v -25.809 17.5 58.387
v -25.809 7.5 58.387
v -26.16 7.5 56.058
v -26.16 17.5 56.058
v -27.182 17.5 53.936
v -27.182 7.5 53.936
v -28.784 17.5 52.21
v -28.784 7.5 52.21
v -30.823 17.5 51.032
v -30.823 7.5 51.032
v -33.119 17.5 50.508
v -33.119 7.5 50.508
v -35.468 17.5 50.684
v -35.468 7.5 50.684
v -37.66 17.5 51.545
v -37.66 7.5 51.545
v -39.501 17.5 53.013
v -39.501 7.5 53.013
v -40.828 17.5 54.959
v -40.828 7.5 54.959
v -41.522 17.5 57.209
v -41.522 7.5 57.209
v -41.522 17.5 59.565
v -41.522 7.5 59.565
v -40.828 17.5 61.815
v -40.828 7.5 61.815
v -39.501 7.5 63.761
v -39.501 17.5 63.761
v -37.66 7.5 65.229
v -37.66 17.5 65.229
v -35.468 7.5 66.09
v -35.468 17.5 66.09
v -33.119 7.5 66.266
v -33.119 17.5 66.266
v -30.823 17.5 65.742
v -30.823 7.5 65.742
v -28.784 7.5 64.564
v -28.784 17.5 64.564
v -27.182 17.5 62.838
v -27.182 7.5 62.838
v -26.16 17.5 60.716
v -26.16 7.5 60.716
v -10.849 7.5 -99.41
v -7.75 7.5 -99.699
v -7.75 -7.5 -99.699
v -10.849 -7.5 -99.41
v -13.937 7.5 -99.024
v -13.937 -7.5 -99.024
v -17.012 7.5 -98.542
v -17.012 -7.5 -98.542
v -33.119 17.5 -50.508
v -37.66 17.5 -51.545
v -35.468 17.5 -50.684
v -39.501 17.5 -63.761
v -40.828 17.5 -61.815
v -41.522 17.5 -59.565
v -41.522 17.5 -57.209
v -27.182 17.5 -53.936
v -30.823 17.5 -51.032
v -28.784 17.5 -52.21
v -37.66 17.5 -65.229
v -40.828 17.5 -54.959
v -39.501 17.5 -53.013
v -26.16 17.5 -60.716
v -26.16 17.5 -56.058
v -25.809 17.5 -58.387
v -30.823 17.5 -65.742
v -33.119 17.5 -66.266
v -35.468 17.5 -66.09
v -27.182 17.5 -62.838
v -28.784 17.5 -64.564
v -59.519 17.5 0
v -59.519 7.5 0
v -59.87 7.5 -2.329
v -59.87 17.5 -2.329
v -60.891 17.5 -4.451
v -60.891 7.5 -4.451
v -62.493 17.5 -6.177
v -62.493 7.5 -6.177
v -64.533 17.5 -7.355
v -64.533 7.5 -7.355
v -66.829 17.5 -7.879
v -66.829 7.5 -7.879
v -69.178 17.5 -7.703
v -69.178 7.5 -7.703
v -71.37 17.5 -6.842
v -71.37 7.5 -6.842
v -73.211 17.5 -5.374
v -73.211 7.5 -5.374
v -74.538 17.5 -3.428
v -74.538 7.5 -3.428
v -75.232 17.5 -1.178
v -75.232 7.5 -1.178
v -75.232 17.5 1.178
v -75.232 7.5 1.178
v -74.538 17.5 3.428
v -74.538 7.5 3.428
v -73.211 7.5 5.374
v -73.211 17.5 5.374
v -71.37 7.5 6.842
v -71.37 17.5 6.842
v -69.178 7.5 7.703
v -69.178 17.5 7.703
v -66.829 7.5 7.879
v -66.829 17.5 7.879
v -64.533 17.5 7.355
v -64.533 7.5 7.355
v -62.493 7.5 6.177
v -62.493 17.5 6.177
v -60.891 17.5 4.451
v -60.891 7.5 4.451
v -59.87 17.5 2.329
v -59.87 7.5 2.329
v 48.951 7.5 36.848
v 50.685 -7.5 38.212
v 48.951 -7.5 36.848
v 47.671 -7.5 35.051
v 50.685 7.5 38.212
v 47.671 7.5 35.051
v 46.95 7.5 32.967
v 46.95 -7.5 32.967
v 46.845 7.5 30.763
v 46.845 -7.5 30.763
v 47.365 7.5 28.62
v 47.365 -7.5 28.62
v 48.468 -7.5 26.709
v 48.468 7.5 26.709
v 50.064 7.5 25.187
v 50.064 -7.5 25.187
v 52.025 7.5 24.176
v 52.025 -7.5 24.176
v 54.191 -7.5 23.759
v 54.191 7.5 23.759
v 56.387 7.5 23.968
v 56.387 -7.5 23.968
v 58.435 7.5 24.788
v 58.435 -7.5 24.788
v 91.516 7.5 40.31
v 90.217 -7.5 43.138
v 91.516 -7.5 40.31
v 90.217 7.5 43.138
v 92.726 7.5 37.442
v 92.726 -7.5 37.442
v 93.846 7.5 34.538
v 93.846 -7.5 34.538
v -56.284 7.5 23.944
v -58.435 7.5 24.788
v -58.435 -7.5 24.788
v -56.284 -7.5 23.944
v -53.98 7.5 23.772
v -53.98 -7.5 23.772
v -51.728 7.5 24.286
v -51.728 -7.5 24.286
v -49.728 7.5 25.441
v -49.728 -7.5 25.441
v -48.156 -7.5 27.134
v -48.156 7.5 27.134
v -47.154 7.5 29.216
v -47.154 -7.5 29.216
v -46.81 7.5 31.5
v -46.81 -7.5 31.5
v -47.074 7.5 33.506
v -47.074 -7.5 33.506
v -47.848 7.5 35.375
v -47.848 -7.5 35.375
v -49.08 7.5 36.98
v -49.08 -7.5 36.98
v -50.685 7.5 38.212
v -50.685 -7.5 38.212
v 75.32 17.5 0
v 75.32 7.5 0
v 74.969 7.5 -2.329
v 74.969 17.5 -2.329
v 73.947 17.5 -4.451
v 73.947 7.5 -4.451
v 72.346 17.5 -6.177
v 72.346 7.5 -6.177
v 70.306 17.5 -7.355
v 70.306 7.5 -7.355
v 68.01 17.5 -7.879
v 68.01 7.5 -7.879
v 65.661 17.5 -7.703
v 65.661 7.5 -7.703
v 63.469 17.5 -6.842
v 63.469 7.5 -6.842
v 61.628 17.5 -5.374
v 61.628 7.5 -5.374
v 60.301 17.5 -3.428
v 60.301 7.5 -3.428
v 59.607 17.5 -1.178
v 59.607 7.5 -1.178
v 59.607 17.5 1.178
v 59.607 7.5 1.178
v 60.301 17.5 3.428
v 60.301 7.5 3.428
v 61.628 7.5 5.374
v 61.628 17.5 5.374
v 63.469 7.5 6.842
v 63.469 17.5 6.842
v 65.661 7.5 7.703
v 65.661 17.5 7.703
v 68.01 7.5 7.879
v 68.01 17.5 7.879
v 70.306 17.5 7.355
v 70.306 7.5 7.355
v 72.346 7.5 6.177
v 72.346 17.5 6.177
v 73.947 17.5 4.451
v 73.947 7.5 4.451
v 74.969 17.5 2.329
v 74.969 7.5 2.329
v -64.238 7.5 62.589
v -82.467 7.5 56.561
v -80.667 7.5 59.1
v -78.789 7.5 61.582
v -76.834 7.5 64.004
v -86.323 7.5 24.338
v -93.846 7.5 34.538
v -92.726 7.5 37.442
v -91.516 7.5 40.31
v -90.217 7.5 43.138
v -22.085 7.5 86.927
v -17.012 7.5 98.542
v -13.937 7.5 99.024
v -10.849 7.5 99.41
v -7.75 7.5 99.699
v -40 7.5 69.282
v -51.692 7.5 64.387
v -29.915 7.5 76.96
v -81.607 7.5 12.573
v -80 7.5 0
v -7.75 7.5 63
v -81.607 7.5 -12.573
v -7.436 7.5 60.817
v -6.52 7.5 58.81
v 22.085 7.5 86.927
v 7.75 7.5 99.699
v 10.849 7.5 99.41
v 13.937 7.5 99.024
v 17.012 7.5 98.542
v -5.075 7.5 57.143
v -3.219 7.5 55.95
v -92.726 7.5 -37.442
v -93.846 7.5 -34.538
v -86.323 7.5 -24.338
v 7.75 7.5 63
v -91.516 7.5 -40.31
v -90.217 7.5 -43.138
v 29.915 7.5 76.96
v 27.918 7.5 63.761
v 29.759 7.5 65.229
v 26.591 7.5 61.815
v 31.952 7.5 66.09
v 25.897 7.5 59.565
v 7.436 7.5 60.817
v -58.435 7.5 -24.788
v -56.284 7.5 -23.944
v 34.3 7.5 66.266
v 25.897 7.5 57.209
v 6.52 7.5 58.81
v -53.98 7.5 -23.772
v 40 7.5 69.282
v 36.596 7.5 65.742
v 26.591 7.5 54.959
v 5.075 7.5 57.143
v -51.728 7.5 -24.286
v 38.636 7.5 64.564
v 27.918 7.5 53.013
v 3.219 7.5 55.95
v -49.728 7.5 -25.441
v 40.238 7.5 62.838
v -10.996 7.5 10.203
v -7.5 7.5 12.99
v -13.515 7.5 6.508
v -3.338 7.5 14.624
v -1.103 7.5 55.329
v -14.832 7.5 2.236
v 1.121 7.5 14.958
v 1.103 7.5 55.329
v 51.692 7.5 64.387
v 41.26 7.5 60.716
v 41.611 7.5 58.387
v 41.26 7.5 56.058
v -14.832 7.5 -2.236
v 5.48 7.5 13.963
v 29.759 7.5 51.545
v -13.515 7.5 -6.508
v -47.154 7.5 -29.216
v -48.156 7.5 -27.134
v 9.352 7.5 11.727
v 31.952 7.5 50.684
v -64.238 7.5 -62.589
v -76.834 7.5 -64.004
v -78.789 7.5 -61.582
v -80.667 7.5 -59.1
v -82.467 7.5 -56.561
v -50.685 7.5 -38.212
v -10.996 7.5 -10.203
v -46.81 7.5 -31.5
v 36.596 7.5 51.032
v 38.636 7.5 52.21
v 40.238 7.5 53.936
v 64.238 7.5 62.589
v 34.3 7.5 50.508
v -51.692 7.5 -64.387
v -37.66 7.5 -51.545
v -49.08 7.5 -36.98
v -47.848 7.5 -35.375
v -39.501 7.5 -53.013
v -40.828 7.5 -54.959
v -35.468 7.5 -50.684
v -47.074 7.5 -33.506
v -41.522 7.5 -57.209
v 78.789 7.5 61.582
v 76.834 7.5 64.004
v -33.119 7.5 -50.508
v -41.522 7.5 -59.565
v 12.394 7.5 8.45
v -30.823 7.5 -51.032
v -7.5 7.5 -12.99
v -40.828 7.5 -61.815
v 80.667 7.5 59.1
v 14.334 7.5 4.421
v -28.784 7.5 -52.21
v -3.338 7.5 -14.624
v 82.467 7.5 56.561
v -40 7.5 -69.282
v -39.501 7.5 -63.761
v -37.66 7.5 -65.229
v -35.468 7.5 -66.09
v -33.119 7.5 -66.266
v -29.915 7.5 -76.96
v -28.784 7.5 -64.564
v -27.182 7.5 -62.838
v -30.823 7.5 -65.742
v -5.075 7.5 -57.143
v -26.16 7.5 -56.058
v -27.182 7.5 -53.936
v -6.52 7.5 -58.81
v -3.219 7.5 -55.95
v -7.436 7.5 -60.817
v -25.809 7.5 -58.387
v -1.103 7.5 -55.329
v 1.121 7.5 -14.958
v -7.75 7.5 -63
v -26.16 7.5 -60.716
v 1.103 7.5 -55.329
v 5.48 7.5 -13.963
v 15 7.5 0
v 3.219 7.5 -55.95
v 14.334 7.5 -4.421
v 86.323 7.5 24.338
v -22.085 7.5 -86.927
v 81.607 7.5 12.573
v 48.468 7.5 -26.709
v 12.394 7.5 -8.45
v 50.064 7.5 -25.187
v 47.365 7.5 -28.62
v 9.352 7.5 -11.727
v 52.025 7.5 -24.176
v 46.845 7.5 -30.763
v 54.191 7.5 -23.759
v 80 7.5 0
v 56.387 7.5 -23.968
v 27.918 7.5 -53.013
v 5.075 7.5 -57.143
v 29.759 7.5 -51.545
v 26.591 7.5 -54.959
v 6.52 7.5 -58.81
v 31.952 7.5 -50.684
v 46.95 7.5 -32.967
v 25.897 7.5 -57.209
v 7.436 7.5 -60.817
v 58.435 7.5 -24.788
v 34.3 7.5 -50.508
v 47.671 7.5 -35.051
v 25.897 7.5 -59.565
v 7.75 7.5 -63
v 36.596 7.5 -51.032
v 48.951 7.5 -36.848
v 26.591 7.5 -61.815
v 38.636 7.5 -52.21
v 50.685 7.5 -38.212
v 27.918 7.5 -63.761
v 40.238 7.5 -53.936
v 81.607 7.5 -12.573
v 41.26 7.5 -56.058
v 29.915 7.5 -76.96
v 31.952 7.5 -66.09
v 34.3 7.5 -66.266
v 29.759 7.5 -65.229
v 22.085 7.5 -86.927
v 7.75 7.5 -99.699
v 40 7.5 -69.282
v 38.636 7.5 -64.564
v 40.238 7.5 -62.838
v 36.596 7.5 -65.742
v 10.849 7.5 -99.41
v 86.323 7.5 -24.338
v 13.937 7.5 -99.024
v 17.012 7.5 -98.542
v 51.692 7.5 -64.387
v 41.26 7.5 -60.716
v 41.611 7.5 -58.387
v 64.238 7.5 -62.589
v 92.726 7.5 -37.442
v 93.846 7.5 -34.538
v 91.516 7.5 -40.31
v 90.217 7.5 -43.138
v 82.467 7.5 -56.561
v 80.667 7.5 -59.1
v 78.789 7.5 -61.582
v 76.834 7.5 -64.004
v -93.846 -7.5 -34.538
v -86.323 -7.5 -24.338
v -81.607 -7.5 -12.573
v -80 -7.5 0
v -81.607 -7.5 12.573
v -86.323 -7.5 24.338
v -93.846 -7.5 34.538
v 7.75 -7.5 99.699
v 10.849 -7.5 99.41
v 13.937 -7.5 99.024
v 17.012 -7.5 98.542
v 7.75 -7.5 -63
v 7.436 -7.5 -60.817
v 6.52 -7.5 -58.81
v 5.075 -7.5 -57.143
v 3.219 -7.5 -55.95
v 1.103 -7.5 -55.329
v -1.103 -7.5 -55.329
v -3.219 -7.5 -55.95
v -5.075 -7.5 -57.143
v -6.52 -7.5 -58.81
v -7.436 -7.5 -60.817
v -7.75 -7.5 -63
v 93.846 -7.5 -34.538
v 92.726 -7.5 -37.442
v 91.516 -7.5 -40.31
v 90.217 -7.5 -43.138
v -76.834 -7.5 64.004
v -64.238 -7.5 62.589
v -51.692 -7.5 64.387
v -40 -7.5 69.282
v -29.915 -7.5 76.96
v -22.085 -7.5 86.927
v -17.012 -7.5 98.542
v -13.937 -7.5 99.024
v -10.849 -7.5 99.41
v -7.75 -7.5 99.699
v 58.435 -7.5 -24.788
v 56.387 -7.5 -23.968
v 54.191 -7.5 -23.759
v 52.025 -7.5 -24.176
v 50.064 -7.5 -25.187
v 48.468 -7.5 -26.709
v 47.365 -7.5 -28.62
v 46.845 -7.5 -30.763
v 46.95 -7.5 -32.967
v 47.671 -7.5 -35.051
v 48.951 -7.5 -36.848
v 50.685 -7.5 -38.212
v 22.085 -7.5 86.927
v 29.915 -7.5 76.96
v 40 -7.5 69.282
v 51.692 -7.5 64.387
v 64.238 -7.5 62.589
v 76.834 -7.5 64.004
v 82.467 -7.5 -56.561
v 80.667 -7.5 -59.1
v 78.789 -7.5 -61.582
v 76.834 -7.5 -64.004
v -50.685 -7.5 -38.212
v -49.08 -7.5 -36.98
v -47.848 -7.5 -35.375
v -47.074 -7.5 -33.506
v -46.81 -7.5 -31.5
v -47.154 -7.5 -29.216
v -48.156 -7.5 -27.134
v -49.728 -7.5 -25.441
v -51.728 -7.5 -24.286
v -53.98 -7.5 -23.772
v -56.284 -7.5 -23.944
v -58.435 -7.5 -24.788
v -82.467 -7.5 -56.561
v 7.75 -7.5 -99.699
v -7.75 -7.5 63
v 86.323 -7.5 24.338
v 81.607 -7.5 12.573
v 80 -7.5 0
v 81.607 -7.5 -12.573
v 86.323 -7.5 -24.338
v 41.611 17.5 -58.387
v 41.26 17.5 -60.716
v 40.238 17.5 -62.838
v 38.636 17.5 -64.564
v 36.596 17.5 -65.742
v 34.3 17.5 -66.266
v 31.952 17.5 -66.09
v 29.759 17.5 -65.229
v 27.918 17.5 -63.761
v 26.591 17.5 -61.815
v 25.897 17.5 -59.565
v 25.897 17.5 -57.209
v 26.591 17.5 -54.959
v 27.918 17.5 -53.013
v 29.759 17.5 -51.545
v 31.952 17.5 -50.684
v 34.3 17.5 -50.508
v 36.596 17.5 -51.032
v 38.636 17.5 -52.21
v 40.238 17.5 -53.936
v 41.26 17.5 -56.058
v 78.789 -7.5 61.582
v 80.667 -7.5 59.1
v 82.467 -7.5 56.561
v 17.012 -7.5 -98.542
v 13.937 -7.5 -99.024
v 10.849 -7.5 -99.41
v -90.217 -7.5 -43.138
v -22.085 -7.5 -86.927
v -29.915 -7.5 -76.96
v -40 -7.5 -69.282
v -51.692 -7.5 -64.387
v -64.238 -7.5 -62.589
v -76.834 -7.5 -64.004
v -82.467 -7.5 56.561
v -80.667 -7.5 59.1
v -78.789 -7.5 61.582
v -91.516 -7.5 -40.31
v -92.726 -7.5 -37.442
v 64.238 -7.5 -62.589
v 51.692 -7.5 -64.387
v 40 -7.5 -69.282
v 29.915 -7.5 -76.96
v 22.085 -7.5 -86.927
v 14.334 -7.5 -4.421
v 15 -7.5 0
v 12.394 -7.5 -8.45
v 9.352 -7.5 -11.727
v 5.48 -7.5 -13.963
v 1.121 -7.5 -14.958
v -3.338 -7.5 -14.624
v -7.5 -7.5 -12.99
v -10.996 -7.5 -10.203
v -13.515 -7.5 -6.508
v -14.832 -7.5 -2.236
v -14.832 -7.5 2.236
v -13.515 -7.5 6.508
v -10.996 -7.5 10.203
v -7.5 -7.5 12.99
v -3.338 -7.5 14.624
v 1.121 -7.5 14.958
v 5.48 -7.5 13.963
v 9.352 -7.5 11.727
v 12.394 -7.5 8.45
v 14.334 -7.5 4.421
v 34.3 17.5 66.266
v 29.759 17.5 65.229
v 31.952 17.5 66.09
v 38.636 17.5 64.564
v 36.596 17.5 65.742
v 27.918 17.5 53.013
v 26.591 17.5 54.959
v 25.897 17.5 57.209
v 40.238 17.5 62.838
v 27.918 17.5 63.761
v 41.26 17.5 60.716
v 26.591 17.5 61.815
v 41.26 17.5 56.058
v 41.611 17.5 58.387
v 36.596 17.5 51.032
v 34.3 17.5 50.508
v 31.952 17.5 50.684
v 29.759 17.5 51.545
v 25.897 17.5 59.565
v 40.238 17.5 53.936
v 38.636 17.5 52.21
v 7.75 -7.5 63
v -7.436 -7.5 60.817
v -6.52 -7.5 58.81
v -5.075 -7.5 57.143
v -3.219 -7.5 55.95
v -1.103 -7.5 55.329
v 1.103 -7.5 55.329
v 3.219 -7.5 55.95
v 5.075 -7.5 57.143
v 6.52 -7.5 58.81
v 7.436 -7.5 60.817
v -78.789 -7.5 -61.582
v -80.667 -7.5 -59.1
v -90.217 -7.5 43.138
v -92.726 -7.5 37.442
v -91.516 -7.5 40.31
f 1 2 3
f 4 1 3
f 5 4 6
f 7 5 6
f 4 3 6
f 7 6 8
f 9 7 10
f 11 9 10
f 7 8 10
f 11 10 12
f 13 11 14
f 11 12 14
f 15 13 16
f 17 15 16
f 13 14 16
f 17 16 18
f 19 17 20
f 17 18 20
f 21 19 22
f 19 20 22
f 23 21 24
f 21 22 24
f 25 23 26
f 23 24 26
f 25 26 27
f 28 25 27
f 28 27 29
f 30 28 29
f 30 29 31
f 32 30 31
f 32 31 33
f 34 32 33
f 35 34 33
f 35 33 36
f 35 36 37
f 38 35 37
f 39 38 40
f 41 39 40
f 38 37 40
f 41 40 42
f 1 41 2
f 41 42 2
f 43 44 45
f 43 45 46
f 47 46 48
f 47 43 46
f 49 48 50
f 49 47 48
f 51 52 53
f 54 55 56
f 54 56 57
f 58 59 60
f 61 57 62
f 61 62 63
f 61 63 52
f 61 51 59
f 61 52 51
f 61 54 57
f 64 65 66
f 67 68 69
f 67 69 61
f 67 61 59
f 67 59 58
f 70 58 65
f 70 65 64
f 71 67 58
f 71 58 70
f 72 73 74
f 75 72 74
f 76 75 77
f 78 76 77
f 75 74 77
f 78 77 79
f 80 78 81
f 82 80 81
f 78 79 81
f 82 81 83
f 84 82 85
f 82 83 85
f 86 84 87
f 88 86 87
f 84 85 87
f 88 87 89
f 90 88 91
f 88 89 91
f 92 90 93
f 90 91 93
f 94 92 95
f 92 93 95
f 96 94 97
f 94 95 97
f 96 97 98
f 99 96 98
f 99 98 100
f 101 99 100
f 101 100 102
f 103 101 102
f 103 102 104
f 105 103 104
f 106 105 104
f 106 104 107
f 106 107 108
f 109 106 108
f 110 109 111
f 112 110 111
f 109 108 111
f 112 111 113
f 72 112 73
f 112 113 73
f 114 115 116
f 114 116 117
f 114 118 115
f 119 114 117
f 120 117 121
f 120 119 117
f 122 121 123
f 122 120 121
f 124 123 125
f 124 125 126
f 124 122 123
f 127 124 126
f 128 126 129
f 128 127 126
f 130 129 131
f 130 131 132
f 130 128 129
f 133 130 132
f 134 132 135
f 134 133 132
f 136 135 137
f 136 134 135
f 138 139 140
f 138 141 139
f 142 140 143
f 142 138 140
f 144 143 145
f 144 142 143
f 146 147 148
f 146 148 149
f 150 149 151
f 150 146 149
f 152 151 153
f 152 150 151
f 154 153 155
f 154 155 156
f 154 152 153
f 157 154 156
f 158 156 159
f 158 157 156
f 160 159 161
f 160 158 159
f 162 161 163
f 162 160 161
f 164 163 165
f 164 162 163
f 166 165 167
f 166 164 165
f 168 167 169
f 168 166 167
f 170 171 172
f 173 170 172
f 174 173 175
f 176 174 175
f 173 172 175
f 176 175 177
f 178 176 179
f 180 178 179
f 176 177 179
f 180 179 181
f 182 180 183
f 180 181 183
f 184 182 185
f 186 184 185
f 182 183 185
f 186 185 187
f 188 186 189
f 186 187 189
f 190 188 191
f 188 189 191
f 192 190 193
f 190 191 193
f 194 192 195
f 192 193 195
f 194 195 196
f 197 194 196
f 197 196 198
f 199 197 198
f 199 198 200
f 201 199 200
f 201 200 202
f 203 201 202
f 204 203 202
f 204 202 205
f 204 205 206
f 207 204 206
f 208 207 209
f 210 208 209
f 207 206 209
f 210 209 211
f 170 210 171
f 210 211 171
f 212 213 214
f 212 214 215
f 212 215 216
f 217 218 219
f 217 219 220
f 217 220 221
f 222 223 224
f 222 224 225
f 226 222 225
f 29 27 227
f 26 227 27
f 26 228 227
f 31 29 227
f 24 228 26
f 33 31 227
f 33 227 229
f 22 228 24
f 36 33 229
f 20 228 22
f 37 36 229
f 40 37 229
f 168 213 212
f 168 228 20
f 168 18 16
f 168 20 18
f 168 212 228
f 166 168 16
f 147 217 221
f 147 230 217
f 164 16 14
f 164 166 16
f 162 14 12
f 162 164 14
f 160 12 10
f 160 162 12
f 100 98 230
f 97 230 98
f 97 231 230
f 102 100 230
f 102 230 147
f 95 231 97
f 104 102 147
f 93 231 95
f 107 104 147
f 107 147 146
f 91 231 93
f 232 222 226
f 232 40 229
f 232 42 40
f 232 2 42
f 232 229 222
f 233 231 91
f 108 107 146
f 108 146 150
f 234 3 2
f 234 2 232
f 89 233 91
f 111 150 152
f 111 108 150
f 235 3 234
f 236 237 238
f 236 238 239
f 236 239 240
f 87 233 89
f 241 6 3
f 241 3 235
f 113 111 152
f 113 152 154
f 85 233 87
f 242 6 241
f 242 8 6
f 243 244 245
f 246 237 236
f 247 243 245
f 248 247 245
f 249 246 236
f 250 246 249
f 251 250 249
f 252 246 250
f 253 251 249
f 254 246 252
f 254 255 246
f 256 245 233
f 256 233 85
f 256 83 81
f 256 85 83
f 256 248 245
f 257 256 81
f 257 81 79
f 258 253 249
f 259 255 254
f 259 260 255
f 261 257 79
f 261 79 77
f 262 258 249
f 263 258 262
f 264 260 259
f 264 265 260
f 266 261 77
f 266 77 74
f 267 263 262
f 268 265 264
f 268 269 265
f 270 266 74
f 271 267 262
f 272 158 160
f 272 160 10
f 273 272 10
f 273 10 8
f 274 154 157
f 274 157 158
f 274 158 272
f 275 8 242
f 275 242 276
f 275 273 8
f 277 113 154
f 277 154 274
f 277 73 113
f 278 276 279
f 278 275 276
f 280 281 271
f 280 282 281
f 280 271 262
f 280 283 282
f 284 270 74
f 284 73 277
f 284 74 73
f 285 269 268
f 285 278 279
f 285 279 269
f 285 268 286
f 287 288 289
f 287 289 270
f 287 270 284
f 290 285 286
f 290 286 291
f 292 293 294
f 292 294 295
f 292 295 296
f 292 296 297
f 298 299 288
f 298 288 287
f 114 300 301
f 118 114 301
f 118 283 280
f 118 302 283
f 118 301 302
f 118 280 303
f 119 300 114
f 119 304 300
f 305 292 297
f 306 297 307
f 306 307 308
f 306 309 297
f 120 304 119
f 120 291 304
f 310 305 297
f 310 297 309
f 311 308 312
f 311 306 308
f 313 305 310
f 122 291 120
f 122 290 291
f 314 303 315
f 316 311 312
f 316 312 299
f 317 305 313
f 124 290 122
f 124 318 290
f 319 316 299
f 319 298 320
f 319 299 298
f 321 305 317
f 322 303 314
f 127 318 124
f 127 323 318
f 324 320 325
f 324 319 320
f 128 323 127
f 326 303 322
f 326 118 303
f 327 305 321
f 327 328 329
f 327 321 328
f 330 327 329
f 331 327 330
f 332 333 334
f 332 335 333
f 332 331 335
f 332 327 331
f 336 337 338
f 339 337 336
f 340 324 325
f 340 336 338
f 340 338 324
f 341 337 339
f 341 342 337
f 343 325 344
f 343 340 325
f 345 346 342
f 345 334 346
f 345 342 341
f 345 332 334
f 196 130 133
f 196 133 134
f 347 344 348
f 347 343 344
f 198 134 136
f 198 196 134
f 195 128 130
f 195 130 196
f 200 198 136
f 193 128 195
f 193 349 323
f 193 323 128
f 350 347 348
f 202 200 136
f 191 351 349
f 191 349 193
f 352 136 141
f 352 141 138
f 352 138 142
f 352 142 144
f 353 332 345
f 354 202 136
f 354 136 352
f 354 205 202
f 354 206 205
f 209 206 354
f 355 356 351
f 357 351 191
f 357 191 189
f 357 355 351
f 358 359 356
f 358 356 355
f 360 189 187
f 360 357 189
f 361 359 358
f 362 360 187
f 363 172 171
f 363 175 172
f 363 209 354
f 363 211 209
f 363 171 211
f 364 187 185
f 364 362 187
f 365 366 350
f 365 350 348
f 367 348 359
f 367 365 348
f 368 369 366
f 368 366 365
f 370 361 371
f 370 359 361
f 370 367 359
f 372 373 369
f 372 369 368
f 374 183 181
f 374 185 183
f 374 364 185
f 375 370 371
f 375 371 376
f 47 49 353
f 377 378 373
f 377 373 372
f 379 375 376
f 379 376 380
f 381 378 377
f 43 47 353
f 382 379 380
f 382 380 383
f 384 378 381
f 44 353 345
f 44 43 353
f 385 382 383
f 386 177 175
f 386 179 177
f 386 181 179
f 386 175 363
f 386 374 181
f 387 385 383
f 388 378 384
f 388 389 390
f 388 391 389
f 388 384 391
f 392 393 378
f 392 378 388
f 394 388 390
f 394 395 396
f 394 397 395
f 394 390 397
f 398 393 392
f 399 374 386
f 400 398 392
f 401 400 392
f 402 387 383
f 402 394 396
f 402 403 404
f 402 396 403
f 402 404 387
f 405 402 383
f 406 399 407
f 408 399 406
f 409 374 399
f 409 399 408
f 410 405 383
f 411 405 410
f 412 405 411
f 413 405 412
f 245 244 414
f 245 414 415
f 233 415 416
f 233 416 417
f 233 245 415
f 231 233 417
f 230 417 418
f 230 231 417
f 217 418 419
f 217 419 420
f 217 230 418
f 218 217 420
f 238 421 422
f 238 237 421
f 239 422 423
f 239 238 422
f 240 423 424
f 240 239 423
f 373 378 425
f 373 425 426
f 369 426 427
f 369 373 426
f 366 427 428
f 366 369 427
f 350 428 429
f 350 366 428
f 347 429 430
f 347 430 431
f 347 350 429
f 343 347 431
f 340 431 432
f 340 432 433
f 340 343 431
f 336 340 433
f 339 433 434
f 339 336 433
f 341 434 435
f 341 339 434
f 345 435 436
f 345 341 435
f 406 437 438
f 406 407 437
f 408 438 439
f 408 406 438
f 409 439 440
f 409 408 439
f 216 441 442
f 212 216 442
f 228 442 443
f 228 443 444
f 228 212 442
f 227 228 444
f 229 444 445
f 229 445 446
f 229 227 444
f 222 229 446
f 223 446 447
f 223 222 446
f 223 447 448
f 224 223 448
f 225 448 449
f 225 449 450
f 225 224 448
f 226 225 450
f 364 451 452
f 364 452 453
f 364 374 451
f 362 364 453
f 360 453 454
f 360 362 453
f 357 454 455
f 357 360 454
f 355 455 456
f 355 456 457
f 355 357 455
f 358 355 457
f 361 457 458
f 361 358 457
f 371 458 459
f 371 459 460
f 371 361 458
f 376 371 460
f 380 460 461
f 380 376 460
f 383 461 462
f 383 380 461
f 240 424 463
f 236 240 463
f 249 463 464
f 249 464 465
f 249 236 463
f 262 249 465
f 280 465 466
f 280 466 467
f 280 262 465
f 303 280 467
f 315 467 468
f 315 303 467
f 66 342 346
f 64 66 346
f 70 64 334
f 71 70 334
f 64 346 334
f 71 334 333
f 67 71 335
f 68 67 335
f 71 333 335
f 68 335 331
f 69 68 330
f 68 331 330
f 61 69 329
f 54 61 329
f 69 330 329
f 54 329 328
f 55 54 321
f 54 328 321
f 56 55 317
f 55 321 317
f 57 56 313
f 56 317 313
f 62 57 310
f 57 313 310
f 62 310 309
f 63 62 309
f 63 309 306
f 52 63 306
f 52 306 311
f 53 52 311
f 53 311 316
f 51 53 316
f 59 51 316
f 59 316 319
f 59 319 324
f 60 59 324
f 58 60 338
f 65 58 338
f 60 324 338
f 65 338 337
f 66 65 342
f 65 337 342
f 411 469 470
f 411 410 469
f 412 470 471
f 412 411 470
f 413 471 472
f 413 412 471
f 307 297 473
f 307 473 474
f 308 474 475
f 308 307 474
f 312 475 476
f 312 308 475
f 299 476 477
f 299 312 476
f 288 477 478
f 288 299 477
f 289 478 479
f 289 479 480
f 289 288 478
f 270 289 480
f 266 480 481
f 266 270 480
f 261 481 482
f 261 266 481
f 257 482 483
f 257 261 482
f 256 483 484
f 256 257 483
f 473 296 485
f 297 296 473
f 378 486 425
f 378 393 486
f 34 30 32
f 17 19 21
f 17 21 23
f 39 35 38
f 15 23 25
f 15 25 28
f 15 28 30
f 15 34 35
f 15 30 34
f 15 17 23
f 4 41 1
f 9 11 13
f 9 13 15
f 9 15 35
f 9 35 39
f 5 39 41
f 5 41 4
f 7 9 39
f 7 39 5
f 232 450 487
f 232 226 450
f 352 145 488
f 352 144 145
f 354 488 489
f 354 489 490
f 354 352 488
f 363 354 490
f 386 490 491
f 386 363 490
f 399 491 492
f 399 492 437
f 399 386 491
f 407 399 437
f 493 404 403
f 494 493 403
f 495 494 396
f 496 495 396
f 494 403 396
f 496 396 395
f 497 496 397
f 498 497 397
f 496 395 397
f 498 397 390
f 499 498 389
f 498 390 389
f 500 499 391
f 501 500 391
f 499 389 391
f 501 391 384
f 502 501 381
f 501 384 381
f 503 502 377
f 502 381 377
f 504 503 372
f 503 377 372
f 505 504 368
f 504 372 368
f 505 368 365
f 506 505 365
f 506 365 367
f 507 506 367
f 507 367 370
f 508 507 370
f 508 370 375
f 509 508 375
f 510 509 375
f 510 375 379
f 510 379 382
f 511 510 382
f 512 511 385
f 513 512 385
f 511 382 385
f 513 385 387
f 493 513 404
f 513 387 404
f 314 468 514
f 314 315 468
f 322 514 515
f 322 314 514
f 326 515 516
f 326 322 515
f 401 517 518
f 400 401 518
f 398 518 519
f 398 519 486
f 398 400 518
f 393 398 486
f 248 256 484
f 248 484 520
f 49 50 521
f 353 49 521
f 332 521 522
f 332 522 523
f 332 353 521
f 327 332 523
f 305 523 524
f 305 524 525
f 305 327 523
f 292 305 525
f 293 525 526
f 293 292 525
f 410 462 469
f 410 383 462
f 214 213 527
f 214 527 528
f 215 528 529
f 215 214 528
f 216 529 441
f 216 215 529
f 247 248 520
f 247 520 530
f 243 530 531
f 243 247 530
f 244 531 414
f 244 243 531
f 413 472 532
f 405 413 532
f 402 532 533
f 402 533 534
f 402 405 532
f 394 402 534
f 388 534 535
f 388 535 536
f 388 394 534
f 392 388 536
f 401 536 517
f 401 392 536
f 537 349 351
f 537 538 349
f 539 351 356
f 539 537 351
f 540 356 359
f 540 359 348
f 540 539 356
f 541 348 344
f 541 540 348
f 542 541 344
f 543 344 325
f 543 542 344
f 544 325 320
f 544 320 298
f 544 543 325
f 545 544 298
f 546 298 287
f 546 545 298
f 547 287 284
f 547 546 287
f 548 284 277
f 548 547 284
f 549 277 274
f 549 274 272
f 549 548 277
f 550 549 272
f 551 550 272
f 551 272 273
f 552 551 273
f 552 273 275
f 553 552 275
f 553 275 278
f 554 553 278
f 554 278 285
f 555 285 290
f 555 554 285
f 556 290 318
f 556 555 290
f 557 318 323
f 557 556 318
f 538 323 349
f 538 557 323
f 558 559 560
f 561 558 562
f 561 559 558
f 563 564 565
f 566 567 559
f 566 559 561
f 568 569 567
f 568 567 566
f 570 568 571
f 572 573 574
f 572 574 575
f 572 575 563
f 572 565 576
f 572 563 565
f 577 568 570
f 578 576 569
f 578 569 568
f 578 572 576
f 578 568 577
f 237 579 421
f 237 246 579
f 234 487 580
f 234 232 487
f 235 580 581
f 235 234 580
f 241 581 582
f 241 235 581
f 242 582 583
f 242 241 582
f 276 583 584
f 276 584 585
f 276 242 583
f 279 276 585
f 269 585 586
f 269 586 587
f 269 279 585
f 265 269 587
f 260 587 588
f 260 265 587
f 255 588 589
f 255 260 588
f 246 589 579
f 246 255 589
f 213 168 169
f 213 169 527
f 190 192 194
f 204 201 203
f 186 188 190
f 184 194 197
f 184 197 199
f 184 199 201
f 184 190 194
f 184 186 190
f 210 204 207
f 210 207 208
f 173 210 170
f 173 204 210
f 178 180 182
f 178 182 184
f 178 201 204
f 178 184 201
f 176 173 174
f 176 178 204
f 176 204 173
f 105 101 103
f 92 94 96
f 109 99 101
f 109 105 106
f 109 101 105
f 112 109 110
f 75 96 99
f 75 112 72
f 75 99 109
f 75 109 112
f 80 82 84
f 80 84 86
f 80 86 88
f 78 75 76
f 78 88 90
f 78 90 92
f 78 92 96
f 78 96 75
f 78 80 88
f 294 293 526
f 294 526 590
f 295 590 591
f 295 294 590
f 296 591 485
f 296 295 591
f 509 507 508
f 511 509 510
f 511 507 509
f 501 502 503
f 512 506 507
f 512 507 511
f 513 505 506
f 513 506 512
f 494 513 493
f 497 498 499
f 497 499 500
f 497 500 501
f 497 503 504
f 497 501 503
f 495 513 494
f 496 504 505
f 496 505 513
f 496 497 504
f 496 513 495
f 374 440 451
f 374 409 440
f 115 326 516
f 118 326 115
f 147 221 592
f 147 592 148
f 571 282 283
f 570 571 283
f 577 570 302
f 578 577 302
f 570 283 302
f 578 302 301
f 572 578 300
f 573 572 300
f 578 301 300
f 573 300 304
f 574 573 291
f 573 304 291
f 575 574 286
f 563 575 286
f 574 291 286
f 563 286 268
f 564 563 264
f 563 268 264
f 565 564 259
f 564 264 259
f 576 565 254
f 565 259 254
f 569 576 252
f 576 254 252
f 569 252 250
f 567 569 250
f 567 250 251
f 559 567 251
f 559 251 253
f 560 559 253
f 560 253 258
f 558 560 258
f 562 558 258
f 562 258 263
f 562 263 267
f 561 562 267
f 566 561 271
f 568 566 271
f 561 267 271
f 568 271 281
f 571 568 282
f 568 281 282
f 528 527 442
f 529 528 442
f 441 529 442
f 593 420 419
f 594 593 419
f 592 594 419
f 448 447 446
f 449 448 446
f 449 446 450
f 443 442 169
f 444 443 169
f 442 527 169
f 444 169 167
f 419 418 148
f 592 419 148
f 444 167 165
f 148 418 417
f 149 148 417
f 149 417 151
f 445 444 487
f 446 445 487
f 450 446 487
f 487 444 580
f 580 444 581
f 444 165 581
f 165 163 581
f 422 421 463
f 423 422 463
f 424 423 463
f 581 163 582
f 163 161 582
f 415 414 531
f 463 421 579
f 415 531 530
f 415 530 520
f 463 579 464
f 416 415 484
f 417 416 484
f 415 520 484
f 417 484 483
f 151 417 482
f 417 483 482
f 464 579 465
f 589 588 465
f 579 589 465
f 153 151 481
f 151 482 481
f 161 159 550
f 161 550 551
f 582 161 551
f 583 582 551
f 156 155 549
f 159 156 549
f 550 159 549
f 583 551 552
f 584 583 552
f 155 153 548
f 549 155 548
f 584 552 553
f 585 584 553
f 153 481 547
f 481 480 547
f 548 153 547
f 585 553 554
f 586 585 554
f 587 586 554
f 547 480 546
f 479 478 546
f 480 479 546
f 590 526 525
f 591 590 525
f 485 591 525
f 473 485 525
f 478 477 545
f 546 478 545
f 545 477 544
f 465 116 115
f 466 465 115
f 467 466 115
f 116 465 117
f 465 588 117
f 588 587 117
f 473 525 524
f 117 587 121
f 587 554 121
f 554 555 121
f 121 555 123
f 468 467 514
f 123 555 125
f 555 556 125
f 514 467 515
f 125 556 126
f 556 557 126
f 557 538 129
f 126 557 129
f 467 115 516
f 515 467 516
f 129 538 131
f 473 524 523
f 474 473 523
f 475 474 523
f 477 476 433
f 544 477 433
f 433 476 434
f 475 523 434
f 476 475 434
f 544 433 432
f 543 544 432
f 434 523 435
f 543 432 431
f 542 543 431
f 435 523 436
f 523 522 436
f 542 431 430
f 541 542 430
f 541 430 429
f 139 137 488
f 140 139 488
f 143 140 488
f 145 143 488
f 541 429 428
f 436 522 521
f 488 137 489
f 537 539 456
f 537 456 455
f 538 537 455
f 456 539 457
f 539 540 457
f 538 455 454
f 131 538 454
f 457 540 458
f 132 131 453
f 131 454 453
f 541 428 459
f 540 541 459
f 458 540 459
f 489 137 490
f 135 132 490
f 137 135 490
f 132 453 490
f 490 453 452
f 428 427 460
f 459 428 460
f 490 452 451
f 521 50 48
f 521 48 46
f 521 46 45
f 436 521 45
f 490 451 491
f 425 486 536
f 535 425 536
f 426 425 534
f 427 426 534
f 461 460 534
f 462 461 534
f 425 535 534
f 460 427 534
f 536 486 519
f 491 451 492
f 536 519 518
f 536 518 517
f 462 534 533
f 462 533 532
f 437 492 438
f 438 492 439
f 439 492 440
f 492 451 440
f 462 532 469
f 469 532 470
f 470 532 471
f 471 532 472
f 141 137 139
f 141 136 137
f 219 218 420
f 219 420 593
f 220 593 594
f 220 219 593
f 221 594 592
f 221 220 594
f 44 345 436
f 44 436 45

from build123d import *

# Parameters (mm, degrees)
SKETCH1_R           = 15
BOSS_EXTRUDE1_DEPTH = 7.5
SKETCH2_R           = 7.90082564
BOSS_EXTRUDE2_DEPTH = 10


with BuildPart() as part:
    # Sketch1 → Boss-Extrude1 (new body, symmetric)
    with BuildSketch(Plane(origin=(0, 0, 0), x_dir=(1, 0, 0), z_dir=(0, 1, 0))):
        with BuildLine():
            Line((7.75, 99.699235203), (7.75, 63))
            ThreePointArc((7.75, 63), (0, 55.25), (-7.75, 63))
            Line((-7.75, 63), (-7.75, 99.699235203))
            ThreePointArc((-7.75, 99.699235203), (-12.394488334, 99.228910399), (-17.011966007, 98.542341217))
            ThreePointArc((-17.011966007, 98.542341217), (-40, 69.282032303), (-76.834187839, 64.003965339))
            ThreePointArc((-76.834187839, 64.003965339), (-79.737513028, 60.348396964), (-82.467070423, 56.561314481))
            Line((-82.467070423, 56.561314481), (-50.684600438, 38.211696879))
            ThreePointArc((-50.684600438, 38.211696879), (-47.847903559, 35.375), (-46.809600438, 31.5))
            ThreePointArc((-46.809600438, 31.5), (-50.684600438, 24.788303121), (-58.434600438, 24.788303121))
            Line((-58.434600438, 24.788303121), (-90.217070423, 43.137920722))
            ThreePointArc((-90.217070423, 43.137920722), (-92.132001362, 38.880513435), (-93.846153846, 34.538375878))
            ThreePointArc((-93.846153846, 34.538375878), (-80, 0), (-93.846153846, -34.538375878))
            ThreePointArc((-93.846153846, -34.538375878), (-92.132001362, -38.880513435), (-90.217070423, -43.137920722))
            Line((-90.217070423, -43.137920722), (-58.434600438, -24.788303121))
            ThreePointArc((-58.434600438, -24.788303121), (-50.684600438, -24.788303121), (-46.809600438, -31.5))
            ThreePointArc((-46.809600438, -31.5), (-47.847903559, -35.375), (-50.684600438, -38.211696879))
            Line((-50.684600438, -38.211696879), (-82.467070423, -56.561314481))
            ThreePointArc((-82.467070423, -56.561314481), (-79.737513028, -60.348396964), (-76.834187839, -64.003965339))
            ThreePointArc((-76.834187839, -64.003965339), (-40, -69.282032303), (-17.011966007, -98.542341217))
            ThreePointArc((-17.011966007, -98.542341217), (-12.394488334, -99.228910399), (-7.75, -99.699235203))
            Line((-7.75, -99.699235203), (-7.75, -63))
            ThreePointArc((-7.75, -63), (0, -55.25), (7.75, -63))
            Line((7.75, -63), (7.75, -99.699235203))
            ThreePointArc((7.75, -99.699235203), (12.394488334, -99.228910399), (17.011966007, -98.542341217))
            ThreePointArc((17.011966007, -98.542341217), (40, -69.282032303), (76.834187839, -64.003965339))
            ThreePointArc((76.834187839, -64.003965339), (79.737513028, -60.348396964), (82.467070423, -56.561314481))
            Line((82.467070423, -56.561314481), (50.684600438, -38.211696879))
            ThreePointArc((50.684600438, -38.211696879), (47.847903559, -27.625), (58.434600438, -24.788303121))
            Line((58.434600438, -24.788303121), (90.217070423, -43.137920722))
            ThreePointArc((90.217070423, -43.137920722), (92.132001362, -38.880513435), (93.846153846, -34.538375878))
            ThreePointArc((93.846153846, -34.538375878), (80, 0), (93.846153846, 34.538375878))
            ThreePointArc((93.846153846, 34.538375878), (92.132001362, 38.880513435), (90.217070423, 43.137920722))
            Line((90.217070423, 43.137920722), (58.434600438, 24.788303121))
            ThreePointArc((58.434600438, 24.788303121), (47.847903559, 27.625), (50.684600438, 38.211696879))
            Line((50.684600438, 38.211696879), (82.467070423, 56.561314481))
            ThreePointArc((82.467070423, 56.561314481), (79.737513028, 60.348396964), (76.834187839, 64.003965339))
            ThreePointArc((76.834187839, 64.003965339), (40, 69.282032303), (17.011966007, 98.542341217))
            ThreePointArc((17.011966007, 98.542341217), (12.394488334, 99.228910399), (7.75, 99.699235203))
        make_face()
        Circle(SKETCH1_R, mode=Mode.SUBTRACT)
    extrude(amount=BOSS_EXTRUDE1_DEPTH, both=True)

    # Sketch2 → Boss-Extrude2 (add)
    with BuildSketch(Plane(origin=(0, 7.5, 0), x_dir=(1, 0, 0), z_dir=(0, 1, 0))):
        with Locations((33.709720075, 58.386947879)):
            Circle(SKETCH2_R)
        with Locations((67.41944015, 0)):
            Circle(SKETCH2_R)
        with Locations((33.709720075, -58.386947879)):
            Circle(SKETCH2_R)
        with Locations((-33.709720075, -58.386947879)):
            Circle(SKETCH2_R)
        with Locations((-67.41944015, 0)):
            Circle(SKETCH2_R)
        with Locations((-33.709720075, 58.386947879)):
            Circle(SKETCH2_R)
    extrude(amount=BOSS_EXTRUDE2_DEPTH)


solid = part.part
